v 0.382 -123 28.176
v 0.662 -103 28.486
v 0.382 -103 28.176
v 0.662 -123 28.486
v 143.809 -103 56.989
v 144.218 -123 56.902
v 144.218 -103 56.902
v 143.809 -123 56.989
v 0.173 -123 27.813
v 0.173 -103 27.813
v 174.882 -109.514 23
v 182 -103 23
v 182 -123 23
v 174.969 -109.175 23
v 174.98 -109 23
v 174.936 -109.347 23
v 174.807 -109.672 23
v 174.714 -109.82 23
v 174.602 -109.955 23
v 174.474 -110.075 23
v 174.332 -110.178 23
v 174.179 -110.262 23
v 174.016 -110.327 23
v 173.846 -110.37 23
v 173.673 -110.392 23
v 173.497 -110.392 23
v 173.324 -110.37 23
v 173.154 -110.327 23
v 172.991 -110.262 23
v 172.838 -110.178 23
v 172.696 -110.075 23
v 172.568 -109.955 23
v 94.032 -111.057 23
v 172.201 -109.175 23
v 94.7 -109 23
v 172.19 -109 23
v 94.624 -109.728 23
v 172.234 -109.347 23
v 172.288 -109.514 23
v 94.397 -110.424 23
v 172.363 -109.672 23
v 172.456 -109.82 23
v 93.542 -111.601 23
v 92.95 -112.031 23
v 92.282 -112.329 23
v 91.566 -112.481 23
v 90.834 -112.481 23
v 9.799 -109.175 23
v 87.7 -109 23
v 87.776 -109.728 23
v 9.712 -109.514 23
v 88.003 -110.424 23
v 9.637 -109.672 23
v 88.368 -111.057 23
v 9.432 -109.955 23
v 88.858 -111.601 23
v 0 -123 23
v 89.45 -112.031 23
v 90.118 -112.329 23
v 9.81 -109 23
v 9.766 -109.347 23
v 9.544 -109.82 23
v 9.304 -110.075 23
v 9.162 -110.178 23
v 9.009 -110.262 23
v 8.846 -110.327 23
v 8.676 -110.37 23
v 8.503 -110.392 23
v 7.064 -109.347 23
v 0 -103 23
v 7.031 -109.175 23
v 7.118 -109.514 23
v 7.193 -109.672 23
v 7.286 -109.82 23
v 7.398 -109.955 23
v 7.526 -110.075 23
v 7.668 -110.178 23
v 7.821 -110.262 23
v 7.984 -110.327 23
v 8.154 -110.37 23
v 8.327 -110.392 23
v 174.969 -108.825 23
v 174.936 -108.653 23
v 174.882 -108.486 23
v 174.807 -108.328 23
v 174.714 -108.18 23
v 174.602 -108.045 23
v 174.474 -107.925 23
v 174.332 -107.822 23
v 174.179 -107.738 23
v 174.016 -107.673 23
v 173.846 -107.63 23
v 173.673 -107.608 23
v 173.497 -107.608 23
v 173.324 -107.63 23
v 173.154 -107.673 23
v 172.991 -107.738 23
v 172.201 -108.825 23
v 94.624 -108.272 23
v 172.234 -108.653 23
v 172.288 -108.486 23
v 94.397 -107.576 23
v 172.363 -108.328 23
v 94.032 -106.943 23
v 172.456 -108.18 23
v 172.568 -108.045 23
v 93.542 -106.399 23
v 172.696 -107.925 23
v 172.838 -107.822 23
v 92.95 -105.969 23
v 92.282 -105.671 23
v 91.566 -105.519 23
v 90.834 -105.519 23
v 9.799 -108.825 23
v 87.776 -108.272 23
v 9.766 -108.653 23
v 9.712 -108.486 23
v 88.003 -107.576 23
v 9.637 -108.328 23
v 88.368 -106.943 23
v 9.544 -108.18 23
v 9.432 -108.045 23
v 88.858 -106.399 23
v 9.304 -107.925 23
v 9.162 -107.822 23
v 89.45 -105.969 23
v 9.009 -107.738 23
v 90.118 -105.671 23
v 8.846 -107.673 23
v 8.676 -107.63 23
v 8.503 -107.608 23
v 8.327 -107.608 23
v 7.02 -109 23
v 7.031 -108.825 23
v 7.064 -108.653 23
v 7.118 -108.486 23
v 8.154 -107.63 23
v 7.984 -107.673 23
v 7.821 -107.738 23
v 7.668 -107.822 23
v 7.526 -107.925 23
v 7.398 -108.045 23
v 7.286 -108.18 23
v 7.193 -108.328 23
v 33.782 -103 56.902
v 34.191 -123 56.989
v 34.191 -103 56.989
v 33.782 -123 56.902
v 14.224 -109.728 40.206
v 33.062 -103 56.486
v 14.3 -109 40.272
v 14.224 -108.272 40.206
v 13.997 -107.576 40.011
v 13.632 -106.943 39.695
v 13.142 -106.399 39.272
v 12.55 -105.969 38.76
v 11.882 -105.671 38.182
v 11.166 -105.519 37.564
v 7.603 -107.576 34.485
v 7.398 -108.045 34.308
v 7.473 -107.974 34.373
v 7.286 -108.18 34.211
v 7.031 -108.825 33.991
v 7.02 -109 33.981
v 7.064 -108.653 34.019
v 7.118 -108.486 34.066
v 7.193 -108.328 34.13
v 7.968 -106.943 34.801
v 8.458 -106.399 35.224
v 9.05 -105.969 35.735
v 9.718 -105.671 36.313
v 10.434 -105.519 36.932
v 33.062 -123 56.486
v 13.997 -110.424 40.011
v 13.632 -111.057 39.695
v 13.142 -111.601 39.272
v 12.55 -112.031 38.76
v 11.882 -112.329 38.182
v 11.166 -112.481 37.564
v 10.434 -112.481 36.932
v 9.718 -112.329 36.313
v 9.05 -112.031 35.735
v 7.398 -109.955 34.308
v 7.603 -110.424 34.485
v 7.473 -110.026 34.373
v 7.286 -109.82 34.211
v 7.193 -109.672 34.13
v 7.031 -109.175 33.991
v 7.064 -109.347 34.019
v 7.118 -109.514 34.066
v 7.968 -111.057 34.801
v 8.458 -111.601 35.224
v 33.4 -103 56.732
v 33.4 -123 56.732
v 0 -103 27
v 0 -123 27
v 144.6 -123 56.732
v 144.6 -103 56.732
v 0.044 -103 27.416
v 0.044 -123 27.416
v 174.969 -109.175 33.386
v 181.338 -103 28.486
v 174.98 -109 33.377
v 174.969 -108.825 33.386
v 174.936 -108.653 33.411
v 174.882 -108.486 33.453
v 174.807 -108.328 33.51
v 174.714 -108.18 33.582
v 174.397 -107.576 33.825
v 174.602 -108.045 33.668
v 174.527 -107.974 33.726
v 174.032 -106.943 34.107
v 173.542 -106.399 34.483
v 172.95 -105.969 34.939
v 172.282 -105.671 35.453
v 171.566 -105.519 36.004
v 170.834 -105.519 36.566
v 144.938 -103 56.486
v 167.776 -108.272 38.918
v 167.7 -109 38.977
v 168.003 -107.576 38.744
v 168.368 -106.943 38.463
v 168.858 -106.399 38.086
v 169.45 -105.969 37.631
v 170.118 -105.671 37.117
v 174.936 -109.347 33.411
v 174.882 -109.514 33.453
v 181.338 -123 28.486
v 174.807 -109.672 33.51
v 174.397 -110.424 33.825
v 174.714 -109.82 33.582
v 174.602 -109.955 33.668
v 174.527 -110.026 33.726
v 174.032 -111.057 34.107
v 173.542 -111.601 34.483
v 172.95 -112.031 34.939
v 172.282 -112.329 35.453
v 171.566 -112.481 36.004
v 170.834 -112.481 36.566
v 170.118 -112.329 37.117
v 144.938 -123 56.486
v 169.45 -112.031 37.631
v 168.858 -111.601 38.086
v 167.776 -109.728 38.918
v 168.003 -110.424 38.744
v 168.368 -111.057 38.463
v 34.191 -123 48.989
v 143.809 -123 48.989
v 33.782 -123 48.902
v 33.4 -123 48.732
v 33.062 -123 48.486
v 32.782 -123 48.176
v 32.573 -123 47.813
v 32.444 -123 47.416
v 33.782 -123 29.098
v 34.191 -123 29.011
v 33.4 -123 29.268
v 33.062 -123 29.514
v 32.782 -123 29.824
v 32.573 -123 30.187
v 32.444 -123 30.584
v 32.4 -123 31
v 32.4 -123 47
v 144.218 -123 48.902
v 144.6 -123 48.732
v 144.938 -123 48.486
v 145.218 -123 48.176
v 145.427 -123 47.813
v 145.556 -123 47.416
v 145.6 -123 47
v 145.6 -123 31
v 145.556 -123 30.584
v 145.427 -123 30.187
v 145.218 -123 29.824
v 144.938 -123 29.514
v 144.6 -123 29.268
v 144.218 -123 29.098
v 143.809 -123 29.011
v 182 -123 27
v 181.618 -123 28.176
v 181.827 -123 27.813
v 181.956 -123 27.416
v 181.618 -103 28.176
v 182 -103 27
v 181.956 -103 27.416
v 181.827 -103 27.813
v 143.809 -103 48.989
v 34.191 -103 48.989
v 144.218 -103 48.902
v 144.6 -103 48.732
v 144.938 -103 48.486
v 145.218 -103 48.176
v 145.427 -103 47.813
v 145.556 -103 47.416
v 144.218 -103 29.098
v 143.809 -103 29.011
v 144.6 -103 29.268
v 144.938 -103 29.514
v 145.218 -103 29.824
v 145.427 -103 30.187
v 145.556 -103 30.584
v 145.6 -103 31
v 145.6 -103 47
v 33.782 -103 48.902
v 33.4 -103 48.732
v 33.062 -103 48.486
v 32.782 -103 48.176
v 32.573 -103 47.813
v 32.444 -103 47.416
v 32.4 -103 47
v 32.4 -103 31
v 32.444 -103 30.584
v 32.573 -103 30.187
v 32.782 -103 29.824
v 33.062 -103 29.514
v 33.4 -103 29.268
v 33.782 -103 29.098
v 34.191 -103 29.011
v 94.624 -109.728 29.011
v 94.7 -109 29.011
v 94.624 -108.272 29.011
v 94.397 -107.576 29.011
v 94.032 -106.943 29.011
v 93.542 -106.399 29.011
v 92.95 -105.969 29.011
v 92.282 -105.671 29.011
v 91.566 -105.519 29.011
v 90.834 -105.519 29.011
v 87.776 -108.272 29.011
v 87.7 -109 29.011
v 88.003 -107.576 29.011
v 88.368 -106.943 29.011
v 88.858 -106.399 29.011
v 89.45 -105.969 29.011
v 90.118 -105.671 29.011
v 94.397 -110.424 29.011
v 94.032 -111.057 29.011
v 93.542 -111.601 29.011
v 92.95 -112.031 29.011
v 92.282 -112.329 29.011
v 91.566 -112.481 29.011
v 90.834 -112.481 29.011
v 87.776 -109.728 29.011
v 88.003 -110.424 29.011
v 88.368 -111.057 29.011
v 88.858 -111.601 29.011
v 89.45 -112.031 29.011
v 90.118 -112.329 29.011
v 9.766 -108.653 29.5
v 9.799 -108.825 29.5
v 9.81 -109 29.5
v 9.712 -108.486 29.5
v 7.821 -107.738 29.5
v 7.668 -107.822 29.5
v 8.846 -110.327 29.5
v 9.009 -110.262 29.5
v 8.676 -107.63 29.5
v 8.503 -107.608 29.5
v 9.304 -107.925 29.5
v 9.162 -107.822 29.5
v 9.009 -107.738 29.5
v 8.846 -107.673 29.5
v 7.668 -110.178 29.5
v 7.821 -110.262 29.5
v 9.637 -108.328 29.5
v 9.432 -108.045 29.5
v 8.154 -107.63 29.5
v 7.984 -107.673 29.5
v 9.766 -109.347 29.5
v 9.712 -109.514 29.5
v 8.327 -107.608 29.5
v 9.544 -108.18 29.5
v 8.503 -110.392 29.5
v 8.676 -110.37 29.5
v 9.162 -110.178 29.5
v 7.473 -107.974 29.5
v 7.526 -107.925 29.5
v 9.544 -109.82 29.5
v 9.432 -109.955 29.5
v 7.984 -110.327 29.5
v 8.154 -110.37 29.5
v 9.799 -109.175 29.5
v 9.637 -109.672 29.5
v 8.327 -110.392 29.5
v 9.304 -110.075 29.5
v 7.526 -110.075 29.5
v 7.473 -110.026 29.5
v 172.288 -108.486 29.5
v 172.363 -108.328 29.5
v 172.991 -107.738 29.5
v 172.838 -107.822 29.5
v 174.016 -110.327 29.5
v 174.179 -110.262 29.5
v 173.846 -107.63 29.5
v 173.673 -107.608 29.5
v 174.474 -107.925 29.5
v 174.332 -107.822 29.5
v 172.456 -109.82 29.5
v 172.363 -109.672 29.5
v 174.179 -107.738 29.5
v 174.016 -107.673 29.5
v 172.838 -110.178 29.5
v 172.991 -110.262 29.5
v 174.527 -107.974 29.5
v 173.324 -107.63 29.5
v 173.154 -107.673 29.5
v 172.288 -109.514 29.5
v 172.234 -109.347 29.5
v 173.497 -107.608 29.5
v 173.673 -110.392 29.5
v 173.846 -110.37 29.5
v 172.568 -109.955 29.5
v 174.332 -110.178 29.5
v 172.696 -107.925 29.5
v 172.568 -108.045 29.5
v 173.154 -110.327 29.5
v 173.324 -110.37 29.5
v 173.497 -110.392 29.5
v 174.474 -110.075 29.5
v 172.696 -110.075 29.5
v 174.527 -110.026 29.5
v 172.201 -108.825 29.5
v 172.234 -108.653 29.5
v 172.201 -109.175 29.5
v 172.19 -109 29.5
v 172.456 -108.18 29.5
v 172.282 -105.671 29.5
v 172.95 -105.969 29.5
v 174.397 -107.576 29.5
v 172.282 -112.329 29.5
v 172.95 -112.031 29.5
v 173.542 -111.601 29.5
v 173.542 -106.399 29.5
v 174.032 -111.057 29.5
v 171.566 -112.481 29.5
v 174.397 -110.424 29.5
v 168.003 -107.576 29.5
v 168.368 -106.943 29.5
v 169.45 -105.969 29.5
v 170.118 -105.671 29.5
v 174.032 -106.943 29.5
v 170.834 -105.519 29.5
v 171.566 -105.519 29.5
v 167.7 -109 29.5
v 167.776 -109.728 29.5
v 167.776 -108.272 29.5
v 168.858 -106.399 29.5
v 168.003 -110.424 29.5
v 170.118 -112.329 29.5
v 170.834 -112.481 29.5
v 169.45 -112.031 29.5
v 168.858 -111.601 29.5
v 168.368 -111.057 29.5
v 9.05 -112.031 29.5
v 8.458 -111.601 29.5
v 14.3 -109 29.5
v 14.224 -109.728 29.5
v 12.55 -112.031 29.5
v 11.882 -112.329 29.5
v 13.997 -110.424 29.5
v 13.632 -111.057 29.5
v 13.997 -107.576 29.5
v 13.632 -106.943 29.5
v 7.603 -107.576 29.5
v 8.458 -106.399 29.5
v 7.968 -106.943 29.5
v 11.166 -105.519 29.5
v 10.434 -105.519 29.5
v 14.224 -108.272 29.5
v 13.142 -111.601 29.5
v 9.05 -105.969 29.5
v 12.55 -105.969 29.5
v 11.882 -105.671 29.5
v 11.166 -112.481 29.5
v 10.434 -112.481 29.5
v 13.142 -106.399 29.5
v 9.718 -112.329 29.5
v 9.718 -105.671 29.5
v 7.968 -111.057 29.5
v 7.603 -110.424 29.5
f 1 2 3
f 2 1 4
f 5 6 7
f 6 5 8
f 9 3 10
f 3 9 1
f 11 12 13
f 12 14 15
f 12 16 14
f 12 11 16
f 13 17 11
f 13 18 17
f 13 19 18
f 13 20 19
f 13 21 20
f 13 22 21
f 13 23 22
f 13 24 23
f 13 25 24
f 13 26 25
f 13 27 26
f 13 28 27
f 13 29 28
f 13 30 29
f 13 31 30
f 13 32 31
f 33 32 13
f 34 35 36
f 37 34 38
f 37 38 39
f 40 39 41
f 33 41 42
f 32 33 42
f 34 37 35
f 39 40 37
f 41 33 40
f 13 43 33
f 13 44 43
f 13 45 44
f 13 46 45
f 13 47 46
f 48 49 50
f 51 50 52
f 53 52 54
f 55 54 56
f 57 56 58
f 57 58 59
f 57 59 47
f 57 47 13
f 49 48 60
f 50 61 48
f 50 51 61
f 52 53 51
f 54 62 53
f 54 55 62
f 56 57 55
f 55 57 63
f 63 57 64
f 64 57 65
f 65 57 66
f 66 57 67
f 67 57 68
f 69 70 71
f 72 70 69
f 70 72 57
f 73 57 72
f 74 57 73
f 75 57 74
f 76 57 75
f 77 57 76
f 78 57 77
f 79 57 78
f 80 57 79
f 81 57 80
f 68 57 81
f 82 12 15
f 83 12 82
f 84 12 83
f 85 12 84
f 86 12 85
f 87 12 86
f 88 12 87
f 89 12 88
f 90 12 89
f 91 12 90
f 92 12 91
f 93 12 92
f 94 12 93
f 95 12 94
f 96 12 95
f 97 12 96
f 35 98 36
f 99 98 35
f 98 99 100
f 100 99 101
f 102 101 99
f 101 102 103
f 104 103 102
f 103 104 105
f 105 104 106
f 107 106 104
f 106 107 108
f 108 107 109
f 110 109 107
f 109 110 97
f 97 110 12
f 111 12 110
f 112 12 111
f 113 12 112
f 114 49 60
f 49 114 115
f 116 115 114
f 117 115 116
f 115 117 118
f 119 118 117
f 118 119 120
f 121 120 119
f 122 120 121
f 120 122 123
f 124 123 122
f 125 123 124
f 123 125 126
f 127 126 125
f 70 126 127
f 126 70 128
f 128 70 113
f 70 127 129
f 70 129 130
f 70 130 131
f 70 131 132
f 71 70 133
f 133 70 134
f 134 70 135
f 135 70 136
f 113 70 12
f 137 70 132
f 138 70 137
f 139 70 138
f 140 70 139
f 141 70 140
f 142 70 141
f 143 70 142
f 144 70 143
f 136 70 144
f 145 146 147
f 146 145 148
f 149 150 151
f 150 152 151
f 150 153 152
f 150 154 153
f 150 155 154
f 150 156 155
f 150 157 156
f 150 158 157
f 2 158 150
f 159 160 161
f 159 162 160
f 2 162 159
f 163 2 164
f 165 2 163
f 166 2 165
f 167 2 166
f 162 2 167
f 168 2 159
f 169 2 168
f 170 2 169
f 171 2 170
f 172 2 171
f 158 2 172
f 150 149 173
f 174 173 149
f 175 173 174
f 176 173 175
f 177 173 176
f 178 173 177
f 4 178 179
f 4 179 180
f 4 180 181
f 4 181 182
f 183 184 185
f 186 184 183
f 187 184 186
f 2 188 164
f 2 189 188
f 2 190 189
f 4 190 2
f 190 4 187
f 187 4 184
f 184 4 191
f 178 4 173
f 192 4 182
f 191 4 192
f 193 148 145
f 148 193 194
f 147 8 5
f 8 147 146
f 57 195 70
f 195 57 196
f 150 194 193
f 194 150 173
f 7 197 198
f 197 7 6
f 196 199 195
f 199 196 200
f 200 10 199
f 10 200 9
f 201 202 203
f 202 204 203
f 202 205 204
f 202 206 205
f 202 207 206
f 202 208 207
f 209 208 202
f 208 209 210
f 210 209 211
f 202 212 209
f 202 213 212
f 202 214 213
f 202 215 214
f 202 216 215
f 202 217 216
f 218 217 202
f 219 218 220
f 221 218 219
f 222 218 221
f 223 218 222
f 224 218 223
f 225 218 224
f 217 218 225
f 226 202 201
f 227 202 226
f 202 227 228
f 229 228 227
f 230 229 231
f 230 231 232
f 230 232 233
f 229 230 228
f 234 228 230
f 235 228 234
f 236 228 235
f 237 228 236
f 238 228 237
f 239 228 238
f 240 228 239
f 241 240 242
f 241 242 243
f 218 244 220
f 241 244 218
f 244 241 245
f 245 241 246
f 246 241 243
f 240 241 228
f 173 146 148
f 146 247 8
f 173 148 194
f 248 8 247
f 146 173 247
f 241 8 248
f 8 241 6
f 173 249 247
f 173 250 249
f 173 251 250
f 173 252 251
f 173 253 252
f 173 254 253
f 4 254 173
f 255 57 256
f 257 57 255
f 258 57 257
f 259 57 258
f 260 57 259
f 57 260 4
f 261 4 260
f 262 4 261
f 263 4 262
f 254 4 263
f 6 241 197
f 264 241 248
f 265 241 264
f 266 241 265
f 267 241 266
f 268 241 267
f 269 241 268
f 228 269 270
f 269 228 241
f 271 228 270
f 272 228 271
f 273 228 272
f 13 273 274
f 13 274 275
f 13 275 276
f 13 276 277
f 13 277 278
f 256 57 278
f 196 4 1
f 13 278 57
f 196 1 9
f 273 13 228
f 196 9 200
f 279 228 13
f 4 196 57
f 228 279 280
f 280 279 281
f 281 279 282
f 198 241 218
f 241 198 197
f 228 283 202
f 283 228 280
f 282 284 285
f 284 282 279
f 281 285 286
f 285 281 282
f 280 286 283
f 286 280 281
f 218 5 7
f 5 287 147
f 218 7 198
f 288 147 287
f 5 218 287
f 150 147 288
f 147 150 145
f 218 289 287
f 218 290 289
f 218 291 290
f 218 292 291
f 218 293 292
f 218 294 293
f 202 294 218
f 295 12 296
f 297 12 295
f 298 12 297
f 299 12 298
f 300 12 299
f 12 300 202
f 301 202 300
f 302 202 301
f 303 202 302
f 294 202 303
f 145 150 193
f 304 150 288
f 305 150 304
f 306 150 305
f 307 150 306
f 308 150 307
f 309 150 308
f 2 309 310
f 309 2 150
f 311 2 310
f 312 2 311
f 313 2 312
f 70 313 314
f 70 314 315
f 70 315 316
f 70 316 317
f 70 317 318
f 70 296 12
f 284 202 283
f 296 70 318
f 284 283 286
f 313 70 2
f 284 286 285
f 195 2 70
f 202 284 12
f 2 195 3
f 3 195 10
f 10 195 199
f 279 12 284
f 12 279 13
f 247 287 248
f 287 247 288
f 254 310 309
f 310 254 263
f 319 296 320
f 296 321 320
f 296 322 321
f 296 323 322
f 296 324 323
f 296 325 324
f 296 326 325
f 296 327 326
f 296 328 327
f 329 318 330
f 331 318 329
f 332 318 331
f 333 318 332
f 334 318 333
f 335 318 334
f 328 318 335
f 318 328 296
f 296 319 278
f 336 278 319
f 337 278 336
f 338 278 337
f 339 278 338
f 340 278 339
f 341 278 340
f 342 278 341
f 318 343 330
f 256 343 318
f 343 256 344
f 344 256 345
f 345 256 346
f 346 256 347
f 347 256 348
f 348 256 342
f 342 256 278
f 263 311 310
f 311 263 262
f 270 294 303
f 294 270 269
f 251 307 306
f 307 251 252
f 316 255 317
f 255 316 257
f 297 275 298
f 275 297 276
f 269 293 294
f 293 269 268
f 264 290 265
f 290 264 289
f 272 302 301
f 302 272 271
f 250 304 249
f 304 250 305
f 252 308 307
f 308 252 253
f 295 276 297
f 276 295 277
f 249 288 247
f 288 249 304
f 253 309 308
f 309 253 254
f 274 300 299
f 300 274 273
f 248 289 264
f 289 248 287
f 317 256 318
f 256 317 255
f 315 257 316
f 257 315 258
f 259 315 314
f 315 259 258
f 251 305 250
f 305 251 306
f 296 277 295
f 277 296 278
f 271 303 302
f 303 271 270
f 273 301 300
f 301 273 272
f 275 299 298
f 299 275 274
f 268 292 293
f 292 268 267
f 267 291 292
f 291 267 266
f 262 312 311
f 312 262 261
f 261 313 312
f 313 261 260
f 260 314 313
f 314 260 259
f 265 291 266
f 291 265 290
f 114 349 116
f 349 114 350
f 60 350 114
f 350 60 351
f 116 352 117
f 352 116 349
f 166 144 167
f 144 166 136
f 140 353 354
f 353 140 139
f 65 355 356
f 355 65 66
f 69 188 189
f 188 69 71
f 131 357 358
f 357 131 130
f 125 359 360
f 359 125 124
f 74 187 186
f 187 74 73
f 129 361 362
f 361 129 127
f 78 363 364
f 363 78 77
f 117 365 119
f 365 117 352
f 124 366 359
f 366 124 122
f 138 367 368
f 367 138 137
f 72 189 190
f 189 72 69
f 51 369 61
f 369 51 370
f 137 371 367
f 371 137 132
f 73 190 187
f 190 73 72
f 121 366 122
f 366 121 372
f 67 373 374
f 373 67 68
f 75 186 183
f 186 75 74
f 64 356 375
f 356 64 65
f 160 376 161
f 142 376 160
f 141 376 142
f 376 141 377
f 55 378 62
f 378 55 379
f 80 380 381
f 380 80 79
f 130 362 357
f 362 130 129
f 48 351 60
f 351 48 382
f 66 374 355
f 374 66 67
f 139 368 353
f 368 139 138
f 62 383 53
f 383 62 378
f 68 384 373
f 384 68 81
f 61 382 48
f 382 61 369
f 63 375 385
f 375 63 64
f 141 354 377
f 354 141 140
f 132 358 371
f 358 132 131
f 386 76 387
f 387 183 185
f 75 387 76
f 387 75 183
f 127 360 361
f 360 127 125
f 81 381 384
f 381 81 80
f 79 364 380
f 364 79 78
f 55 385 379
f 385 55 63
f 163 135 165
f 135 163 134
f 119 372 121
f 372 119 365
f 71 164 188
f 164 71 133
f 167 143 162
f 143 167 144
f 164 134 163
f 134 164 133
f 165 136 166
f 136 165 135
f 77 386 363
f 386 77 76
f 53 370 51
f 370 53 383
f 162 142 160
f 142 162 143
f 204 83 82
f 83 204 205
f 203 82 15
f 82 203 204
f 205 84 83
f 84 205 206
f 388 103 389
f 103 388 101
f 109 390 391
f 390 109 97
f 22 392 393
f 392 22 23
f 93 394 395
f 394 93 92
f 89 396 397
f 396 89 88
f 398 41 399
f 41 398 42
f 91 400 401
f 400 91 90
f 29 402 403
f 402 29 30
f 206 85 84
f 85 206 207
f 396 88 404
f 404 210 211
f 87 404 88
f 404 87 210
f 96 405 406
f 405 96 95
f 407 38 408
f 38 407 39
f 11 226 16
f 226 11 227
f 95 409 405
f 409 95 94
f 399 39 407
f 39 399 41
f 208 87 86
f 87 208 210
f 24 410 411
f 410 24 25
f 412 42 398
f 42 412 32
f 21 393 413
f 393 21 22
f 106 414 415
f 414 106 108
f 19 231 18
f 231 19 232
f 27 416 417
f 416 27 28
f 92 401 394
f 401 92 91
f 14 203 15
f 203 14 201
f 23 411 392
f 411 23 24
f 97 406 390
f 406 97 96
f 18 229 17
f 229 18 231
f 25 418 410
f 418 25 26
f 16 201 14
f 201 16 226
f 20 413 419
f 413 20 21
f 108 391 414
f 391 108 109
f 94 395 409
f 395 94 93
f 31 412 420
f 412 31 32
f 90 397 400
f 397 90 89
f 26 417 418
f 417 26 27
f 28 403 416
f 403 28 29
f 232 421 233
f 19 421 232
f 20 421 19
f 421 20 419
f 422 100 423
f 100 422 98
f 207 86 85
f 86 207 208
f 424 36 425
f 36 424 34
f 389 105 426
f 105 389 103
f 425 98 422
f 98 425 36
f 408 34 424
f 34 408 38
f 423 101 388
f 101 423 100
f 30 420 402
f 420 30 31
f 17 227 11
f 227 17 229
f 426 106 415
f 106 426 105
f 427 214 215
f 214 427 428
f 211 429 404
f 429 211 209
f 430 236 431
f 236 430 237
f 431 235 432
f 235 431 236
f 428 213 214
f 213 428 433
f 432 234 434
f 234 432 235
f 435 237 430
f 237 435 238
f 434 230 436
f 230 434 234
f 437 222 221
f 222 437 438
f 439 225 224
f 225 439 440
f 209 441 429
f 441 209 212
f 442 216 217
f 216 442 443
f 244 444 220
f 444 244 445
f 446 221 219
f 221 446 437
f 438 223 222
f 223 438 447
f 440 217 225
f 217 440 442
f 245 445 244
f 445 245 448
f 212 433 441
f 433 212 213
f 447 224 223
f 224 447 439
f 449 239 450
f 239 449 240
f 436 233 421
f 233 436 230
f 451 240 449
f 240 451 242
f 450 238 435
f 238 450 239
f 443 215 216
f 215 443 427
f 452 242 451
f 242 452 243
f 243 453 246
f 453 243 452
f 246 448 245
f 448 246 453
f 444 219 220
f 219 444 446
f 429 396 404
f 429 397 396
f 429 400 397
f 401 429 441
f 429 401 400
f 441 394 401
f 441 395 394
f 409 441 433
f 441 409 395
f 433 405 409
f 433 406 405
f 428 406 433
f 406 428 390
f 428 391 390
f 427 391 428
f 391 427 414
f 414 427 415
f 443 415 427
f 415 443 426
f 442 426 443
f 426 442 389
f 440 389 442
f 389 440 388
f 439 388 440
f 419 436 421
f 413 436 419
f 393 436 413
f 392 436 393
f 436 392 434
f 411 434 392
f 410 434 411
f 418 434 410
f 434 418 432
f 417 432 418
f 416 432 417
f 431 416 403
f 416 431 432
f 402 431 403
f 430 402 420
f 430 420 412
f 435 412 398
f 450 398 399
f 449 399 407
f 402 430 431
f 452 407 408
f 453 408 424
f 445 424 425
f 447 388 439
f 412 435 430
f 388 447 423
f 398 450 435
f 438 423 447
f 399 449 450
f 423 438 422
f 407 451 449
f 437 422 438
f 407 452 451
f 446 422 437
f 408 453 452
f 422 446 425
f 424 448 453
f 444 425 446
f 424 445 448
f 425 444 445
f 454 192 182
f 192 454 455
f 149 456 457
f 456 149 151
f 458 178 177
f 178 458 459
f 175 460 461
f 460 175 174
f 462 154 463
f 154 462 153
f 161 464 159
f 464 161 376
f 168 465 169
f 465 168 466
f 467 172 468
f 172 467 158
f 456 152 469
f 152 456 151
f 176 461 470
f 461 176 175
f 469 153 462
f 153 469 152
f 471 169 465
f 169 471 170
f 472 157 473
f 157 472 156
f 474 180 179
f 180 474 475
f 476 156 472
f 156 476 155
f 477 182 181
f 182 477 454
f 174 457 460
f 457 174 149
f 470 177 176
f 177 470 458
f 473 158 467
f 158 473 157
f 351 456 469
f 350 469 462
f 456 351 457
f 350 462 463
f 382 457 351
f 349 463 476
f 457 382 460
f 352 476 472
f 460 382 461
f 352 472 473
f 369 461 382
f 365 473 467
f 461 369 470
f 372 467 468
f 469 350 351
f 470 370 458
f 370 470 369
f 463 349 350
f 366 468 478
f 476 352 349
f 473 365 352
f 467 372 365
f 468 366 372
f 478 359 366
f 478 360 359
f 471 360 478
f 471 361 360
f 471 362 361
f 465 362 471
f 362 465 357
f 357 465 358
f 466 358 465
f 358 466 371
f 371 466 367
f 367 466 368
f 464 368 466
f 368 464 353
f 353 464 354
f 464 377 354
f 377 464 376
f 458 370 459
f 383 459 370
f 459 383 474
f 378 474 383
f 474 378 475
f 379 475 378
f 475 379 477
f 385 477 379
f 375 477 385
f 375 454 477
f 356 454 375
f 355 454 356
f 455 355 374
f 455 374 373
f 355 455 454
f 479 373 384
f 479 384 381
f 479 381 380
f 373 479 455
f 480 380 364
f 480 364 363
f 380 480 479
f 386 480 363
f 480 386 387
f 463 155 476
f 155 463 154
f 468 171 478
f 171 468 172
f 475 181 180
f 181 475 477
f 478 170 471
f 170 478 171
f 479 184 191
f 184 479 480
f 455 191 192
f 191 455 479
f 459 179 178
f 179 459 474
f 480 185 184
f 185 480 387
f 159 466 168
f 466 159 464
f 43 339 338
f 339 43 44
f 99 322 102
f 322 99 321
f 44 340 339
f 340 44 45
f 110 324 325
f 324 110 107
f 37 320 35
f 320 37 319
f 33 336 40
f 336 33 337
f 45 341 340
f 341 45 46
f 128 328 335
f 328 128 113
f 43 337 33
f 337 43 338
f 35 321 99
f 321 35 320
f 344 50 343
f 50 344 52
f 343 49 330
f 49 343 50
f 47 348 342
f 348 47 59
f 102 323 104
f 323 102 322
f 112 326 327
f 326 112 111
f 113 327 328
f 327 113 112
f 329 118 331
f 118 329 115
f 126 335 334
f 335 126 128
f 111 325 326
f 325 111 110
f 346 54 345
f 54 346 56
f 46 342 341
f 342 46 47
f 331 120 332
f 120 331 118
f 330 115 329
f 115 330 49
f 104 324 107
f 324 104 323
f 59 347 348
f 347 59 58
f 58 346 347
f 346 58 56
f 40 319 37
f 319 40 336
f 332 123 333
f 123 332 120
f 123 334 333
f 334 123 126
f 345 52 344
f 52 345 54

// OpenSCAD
// file: ../modules/fasteners.scad
include<params.scad>;

// Shared fastener helpers.
// These are intentionally face-based so insert pockets can stay flush with the
// local mating face instead of assuming one global part thickness.

module fastenerThroughHole(
    holeDepth,
    holeDiam = screwDiam,
    holeCenter = true
) {
    cylinder(h = holeDepth, d = holeDiam, center = holeCenter, $fn = 30);
}

module fastenerCounterboreFromFace(
    faceZ,
    boreDepth = screwHeadHeight + tolerance,
    boreDiam = screwHeadDiam,
    direction = -1
) {
    translate([0,0,faceZ + direction * boreDepth/2])
    cylinder(h = boreDepth + 0.01, d = boreDiam, center = true, $fn = 30);
}

module fastenerInsertPocketFromFace(
    faceZ,
    pocketDepth = insertLength,
    pocketDiam = insertOuterDiam,
    direction = -1,
    includeLeadIn = true
) {
    translate([0,0,faceZ + direction * pocketDepth/2])
    cylinder(h = pocketDepth + 0.01, d = pocketDiam, center = true, $fn = 40);

    if (includeLeadIn && insertLeadInDepth > 0) {
        translate([0,0,faceZ + direction * insertLeadInDepth/2])
        cylinder(h = insertLeadInDepth + 0.01, d = insertLeadInDiam, center = true, $fn = 40);
    }
}

module fastenerInsertReadyHole(
    throughDepth,
    faceZ,
    direction = -1,
    throughDiam = screwDiam,
    pocketDepth = insertLength,
    pocketDiam = insertOuterDiam,
    includeLeadIn = true
) {
    fastenerThroughHole(throughDepth, holeDiam = throughDiam);
    fastenerInsertPocketFromFace(
        faceZ = faceZ,
        pocketDepth = pocketDepth,
        pocketDiam = pocketDiam,
        direction = direction,
        includeLeadIn = includeLeadIn
    );
}
// file: ../modules/stripperPlate.scad
include<params.scad>;
include<fasteners.scad>;
use<carriageScrews.scad>;

module stripperPlate(col = "blue") {
    $fn = 50;
    color(col)
    hull() {
        translate([-CAM_PLATE_WIDTH/2,NEEDLE_EXTENSION-4,-camPlateHeight])
        sphere(d = camPlateHeight/2);

        translate([-camPlateHeight * 2.5,NEEDLE_EXTENSION-camPlateHeight/2,-camPlateHeight])
        sphere(d = camPlateHeight/2);

        translate([-camPlateHeight * 1.5 - 0.5,NEEDLE_EXTENSION-camPlateHeight * 1.5 -2,-camPlateHeight])
        cylinder(h = camPlateHeight/2, d = camPlateHeight*3, center = true);

        translate([-CAM_PLATE_WIDTH/2 + 55/2, -(camPlateHeight)/2, -(camPlateHeight + 1)/2])
        rotate([0,90,0])
        cylinder(55, d = camPlateHeight + 1, center = true, $fn = 30);
    }
}

module stripperPlateNose() {
    color("blue")
    hull () {
        translate([-CAM_PLATE_WIDTH/2 + 55/2, -(camPlateHeight)/2, -(camPlateHeight + 1)/2])
        rotate([0,90,0])
        cylinder(55, d = camPlateHeight + 1, center = true, $fn = 30);

        translate([-CAM_PLATE_WIDTH/2 + 55/2,-(camPlateHeight + 1.5),needleSlotHeight + 2])
        rotate([0,90,0])
        cylinder(55, d = needleSlotHeight + 2.5, center = true, $fn = 50);
    }
}

module yarnCarrierCutout() {
    hull() {
        translate([CAM_PLATE_WIDTH/2,YARN_DEPOSIT_Y,(camHeight + camPlateHeight*2)])
        cylinder(h = 40, r = 29, center = true);

        translate([CAM_PLATE_WIDTH/2,YARN_DEPOSIT_Y - 35,(camHeight + camPlateHeight)/2])
        cylinder(h = camHeight + camPlateHeight, r = (CAM_PLATE_WIDTH - 55*2)/2, center = true);
    }
}

module stripperPlateHalf() {
    difference() {
        translate([CAM_PLATE_WIDTH/2,-NEEDLE_BED_DEPTH - NEEDLE_EXTENSION - tolerance * 2,-needleSlotHeight]) {
            union() {
                stripperPlate();
                stripperPlateNose();
            }
        }
        translate([-1,-tolerance, -tolerance])
        translate([0,-(NEEDLE_BED_DEPTH + NEEDLE_EXTENSION + camPlateHeight + 2), 2])
        cube([CAM_PLATE_WIDTH + 4, camPlateHeight + 2, camPlateHeight + 2], center = false);
        yarnCarrierCutout();
        stripperPlateScrewPositions()
        fastenerThroughHole(screwHeight);
        stripperPlateCounterborePositions()
        fastenerCounterbore(
            boreDepth = screwHeadHeight,
            boreCenter = true
        );
    }
}

module renderStripperPlate() {
    stripperPlateHalf();

    translate([CAM_PLATE_WIDTH, 0, 0])
    mirror([1,0,0])
    stripperPlateHalf();
}
// file: stripperPlate.scad
use<../modules/stripperPlate.scad>;

renderStripperPlate();
// file: ../modules/carriageScrews.scad
include<params.scad>;

module carriageBackPlateScrewPositions() {
    translate([screwHeadDiam*1.5,-6,camHeight + camPlateHeight/2]) 
    children();
    
    translate([CAM_PLATE_WIDTH/2,-6,camHeight + camPlateHeight/2]) 
    children();
    
    translate([CAM_PLATE_WIDTH - screwHeadDiam*1.5,-6,camHeight + camPlateHeight/2]) 
    children();

    translate([screwHeadDiam*1.5,-(NEEDLE_BED_DEPTH - COMB - 6),camHeight + camPlateHeight/2]) 
    children();
    
    translate([CAM_PLATE_WIDTH/2,-(NEEDLE_BED_DEPTH - COMB - 6),camHeight + camPlateHeight/2]) 
    children();
    
    translate([CAM_PLATE_WIDTH - screwHeadDiam*1.5,-(NEEDLE_BED_DEPTH - COMB - 6),camHeight + camPlateHeight/2]) 
    children();
}

module stripperPlateScrewPositions() {
    translate([0,-(NEEDLE_BED_DEPTH + NEEDLE_EXTENSION + camPlateHeight - 0.25),0]) {
        translate([0,0,2]) {
            translate([screwHeadDiam*1.5,0,0])
            children();
            
            translate([screwHeadDiam*1.5 + 35,0,0])
            children();
            
            translate([CAM_PLATE_WIDTH - screwHeadDiam*1.5 - 35,0,0])
            children();
            
            translate([CAM_PLATE_WIDTH - screwHeadDiam*1.5,0,0])
            children();
        }
    }
}

module stripperPlateCounterborePositions() {
    translate([0,-(NEEDLE_BED_DEPTH + NEEDLE_EXTENSION + camPlateHeight - 0.25),0]) {
        translate([0,0,6.5 + screwHeadHeight/2]) {
            translate([screwHeadDiam*1.5,0,0])
            children();
 
            translate([screwHeadDiam*1.5 + 35,0,0])
            children();

            translate([CAM_PLATE_WIDTH - screwHeadDiam *1.5 -35,0,0])
            children();

            translate([CAM_PLATE_WIDTH - screwHeadDiam*1.5,0,0])
            children();
        }
    }
}

module yarnFeederPlateScrewPositions() {
    translate([0,-(NEEDLE_BED_DEPTH - COMB/2),0]) {
        translate([0,0,2 - tolerance]) {
            translate([screwHeadDiam*1.5,0,0])
            children();
            
            translate([screwHeadDiam*1.5 + 35,0,0])
            children();
            
            translate([CAM_PLATE_WIDTH - screwHeadDiam*1.5 - 35,0,0])
            children();
            
            translate([CAM_PLATE_WIDTH - screwHeadDiam*1.5,0,0])
            children();
        }
    }
}

module yarnFeederPlateCounterborePositions() {
    translate([0,-(NEEDLE_BED_DEPTH - COMB/2),0]) {
        translate([0,0,2 - tolerance]) {
            translate([screwHeadDiam*1.5,0,0])
            children();
 
            translate([screwHeadDiam*1.5 + 35,0,0])
            children();

            translate([CAM_PLATE_WIDTH - screwHeadDiam*1.5 -35,0,0])
            children();

            translate([CAM_PLATE_WIDTH - screwHeadDiam*1.5,0,0])
            children();
        }
    }
}

module carriageScrews() {
    carriageBackPlateScrewPositions()
    cylinder(h= 12*2, d = screwDiam, center = true);

    stripperPlateScrewPositions()
    cylinder(h= screwHeight, d = screwDiam, center = true);

    stripperPlateCounterborePositions()
    cylinder(h= screwHeadHeight, d = screwHeadDiam, center = true);

    yarnFeederPlateScrewPositions()
    cylinder(h= screwHeight-2, d = 2.8, center = false);

    yarnFeederPlateCounterborePositions()
    cylinder(h= screwHeadHeight + tolerance, d = screwHeadDiam, center = false);
}
// file: ../modules/params.scad
/*

Values in `camelCase` are user-variable (within reason); 
values like numNeedles and screwDiam, etc.,  can be modified to
accommodate user preference or hardware subsitution. 

Values in `ALL_CAPS` should be considered CONSTANTS and should
only be modified with *extreme caution* as they will affect the 
relationship between the needles and the cams, which could
prevent stitches from forming correctly.

I recommend only modifying these constants if you are also 
making changes to the cam design in the technical sketch.
*/

$fn = 50;

defaultGauge = 4.5;
defaultNumNeedles = 25;
defaultTolerance = 0.2;
defaultScrewPlacement = 3;
defaultShowScrewPreview = false;
defaultScrewPreset = "4-40";
defaultCustomScrewDiam = 2.79;
defaultCustomScrewHeadDiam = 5.21;
defaultCustomScrewHeadHeight = 2.41;
defaultCustomNutHeight = 2.8;
defaultUseThreadedInserts = false;
defaultInsertOuterDiam = 4.6;
defaultInsertLength = 4.0;
defaultInsertLeadInDiam = 5.2;
defaultInsertLeadInDepth = 1.2;

screwPreset = is_undef(cfaScrewPreset) ? defaultScrewPreset : cfaScrewPreset;

gauge = is_undef(cfaGauge) ? defaultGauge : cfaGauge; // I recommend using one of the predefined gauges above
numNeedles = is_undef(cfaNumNeedles) ? defaultNumNeedles : cfaNumNeedles;
tolerance = is_undef(cfaTolerance) ? defaultTolerance : cfaTolerance; // allows a bit of room for parts that have to fit together; adjust according to your printer's precision
screwPlacement = is_undef(cfaScrewPlacement) ? defaultScrewPlacement : cfaScrewPlacement; // how many needles from edge of bed; min 2, max floor(numNeedles/2)
showScrewCutouts = is_undef(cfaShowScrewPreview) ? defaultShowScrewPreview : cfaShowScrewPreview;
useThreadedInserts = is_undef(cfaUseThreadedInserts) ? defaultUseThreadedInserts : cfaUseThreadedInserts;

customScrewDiam = is_undef(cfaScrewDiam) ? defaultCustomScrewDiam : cfaScrewDiam;
customScrewHeadDiam = is_undef(cfaScrewHeadDiam) ? defaultCustomScrewHeadDiam : cfaScrewHeadDiam;
customScrewHeadHeight = is_undef(cfaScrewHeadHeight) ? defaultCustomScrewHeadHeight : cfaScrewHeadHeight;
customNutHeight = is_undef(cfaNutHeight) ? defaultCustomNutHeight : cfaNutHeight;
insertOuterDiam = is_undef(cfaInsertOuterDiam) ? defaultInsertOuterDiam : cfaInsertOuterDiam;
insertLength = is_undef(cfaInsertLength) ? defaultInsertLength : cfaInsertLength;
insertLeadInDiam = is_undef(cfaInsertLeadInDiam) ? defaultInsertLeadInDiam : cfaInsertLeadInDiam;
insertLeadInDepth = is_undef(cfaInsertLeadInDepth) ? defaultInsertLeadInDepth : cfaInsertLeadInDepth;

// ---
// Hardware dimensions 
// (actual measurements, no tolerances)

FIXED_SCREW_LENGTH = 14.62;

// - pan head 4-40 machine screws (M3 should also work where these are used)
screwDiam =
    screwPreset == "M3" ? 2.8 :
    screwPreset == "Custom" ? customScrewDiam :
    2.79;
// Keep printed bed height stable across hardware choices and later reprints.
screwHeight = FIXED_SCREW_LENGTH;
screwHeadHeight =
    (screwPreset == "M3" ? 2.4 :
    screwPreset == "Custom" ? customScrewHeadHeight :
    2.41) + tolerance * 2;
screwHeadDiam =
    (screwPreset == "M3" ? 7 :
    screwPreset == "Custom" ? customScrewHeadDiam :
    5.21) + tolerance * 2;
nutHeight =
    screwPreset == "M3" ? 2.4 :
    screwPreset == "Custom" ? customNutHeight :
    2.8;

// ---
// Needle dimensions
// - Brother needles
BUTT_HEIGHT = 15;
NEEDLE_WIDTH = 1.25;
NEEDLE_LEG_HEIGHT = 1.85;
HOOK_DIAM = 3.5;

// ---
// Needle Bed Zones
BACK_COVER = 45;
OOW_TRACK = 8;
B_TRACK = 42; // will divvy up working tracks (B & C position) later
C_TRACK = 0;
WORKING_TRACK = B_TRACK + C_TRACK;
HOLD_TRACK = 8;
SPONGE_BAR = 12;
COMB = 29;
NEEDLE_EXTENSION = 34.5;

// ---
// Needle bed dimensions
NEEDLE_BED_DEPTH = BACK_COVER + OOW_TRACK + WORKING_TRACK + HOLD_TRACK + SPONGE_BAR + COMB;
needleBedHeight = screwHeight + 2;
needleSlotHeight = NEEDLE_LEG_HEIGHT * 2 + screwHeadHeight;
needleSlotWidth = NEEDLE_WIDTH + 0.25; // add a small amount of clearance
combWidth = gauge*2/3; // width of cutouts for stitch formation; this gives room for the thickness of the yarn looped around the needle when it pulls back into the slot, but has to balance leaving enough material for the remaining "teeth" to not be too fragile
spongeThickness = 2.5;
spongeBarThickness = needleSlotHeight - NEEDLE_LEG_HEIGHT - spongeThickness;
YARN_DEPOSIT_Y = -155.1;
YARN_DEPOSIT_Z = -needleSlotHeight + HOOK_DIAM;
connectorOffset = 20;

// ---
// Carriage dimensions
// refer to technical sketch
camHeight = BUTT_HEIGHT; // thickness of the tracks the needles ride along
camPlateHeight = 4; // plate behind the cams
CAM_PLATE_WIDTH = 91 * 2; 
CAM_PLATE_DEPTH = NEEDLE_BED_DEPTH - COMB + 6;

railDepth = 8;
railHeight = 8; // ???
xOffset = 16.5;
//vCamScrews = [[34-xOffset, -90.25, 0],[58-xOffset, -74.25, 0],[86-xOffset,-90.25, 0]];

module screwPreview() {
    if (showScrewCutouts) {
        #children();
    } else {
        children();
    }
}
// main file
include<../modules/params.scad>;
use<../modules/carriageScrews.scad>;
use<../parts/stripperPlate.scad>;

/* [Parameters] */
Show_cutaway = false;
/* [Hidden] */


Delta = 0.1;  // tiny adj for neater boolean subtractions
cylres30 = 30;

module handle_screws() {
	width = SPONGE_BAR + 8;
	carriageScrews();
	translate([CAM_PLATE_WIDTH-10.8,-109,28])
		cylinder(h=10, d=7, center=true, $fn=cylres30);
	translate([10.8,-109,28])
		cylinder(h=10, d=7, center=true, $fn=cylres30);
	// middle
	translate([CAM_PLATE_WIDTH-90.8,-109,28])
		cylinder(h=10, d=7, center=true, $fn=cylres30);
}


module handle_part() {
	width = SPONGE_BAR + 8;
	difference() {
		// handle outer shape
		hull() {
			cube([CAM_PLATE_WIDTH, width, camPlateHeight]);
			rotate([-90,0,0]) {
				// left edge
				translate([camPlateHeight/2,-camPlateHeight,width/2])
					cylinder(width, d=camPlateHeight,  center=true, $fn=cylres30);
				// right edge
				translate([CAM_PLATE_WIDTH-camPlateHeight/2,-camPlateHeight,width/2])
					cylinder(width, d=camPlateHeight,  center=true, $fn=cylres30);
				// middle 2
				translate([CAM_PLATE_WIDTH*0.8-camPlateHeight/2,-camPlateHeight*8,width/2])
					cylinder(width, d=camPlateHeight,  center=true, $fn=cylres30);
				translate([CAM_PLATE_WIDTH*0.2-camPlateHeight/2,-camPlateHeight*8,width/2])
					cylinder(width, d=camPlateHeight,  center=true, $fn=cylres30);
			}
		}
		// void in middle of handle
		hull() {
			rotate([-90,0,0]) {
				// bottom pair
				translate([CAM_PLATE_WIDTH*0.8-camPlateHeight/2,-camPlateHeight*2,width/2])
					cylinder(width+Delta*2, d=camPlateHeight,  center=true, $fn=cylres30);
				translate([CAM_PLATE_WIDTH*0.2-camPlateHeight/2,-camPlateHeight*2,width/2])
					cylinder(width+Delta*2, d=camPlateHeight,  center=true, $fn=cylres30);
				// top pair
				translate([CAM_PLATE_WIDTH*0.8-camPlateHeight/2,-camPlateHeight*6,width/2])
					cylinder(width+Delta*2, d=camPlateHeight,  center=true, $fn=cylres30);
				translate([CAM_PLATE_WIDTH*0.2-camPlateHeight/2,-camPlateHeight*6,width/2])
					cylinder(width+Delta*2, d=camPlateHeight,  center=true, $fn=cylres30);
			}
		}
	}
}

// clip away all but middle screw so can lower it for recess in handle
module middle_screw() {
	difference() {
	translate([0,0,-1])
		//carriageScrews();
		handle_screws();
		// block left hole
		translate([0,-140,0])
			cube([60,60,40]);
		translate([CAM_PLATE_WIDTH-30,-140,0])
			cube([60,60,40]);
		}
}

module handle() {
	difference() {
		color("PowderBlue")
		translate([0,-(NEEDLE_BED_DEPTH - COMB + 8),camHeight + camPlateHeight*2])
			handle_part();
		// outer screws
		translate([0,0,-5])
		scale([1,1,1.5])
			handle_screws();
		// inner screw recess
		middle_screw();
	}
}

if (Show_cutaway) {
    difference() {
        handle();
        color("Red") {
        translate([-10,-109,10])
            cube([20,30,30]);
        }
    }
} else
    handle();
